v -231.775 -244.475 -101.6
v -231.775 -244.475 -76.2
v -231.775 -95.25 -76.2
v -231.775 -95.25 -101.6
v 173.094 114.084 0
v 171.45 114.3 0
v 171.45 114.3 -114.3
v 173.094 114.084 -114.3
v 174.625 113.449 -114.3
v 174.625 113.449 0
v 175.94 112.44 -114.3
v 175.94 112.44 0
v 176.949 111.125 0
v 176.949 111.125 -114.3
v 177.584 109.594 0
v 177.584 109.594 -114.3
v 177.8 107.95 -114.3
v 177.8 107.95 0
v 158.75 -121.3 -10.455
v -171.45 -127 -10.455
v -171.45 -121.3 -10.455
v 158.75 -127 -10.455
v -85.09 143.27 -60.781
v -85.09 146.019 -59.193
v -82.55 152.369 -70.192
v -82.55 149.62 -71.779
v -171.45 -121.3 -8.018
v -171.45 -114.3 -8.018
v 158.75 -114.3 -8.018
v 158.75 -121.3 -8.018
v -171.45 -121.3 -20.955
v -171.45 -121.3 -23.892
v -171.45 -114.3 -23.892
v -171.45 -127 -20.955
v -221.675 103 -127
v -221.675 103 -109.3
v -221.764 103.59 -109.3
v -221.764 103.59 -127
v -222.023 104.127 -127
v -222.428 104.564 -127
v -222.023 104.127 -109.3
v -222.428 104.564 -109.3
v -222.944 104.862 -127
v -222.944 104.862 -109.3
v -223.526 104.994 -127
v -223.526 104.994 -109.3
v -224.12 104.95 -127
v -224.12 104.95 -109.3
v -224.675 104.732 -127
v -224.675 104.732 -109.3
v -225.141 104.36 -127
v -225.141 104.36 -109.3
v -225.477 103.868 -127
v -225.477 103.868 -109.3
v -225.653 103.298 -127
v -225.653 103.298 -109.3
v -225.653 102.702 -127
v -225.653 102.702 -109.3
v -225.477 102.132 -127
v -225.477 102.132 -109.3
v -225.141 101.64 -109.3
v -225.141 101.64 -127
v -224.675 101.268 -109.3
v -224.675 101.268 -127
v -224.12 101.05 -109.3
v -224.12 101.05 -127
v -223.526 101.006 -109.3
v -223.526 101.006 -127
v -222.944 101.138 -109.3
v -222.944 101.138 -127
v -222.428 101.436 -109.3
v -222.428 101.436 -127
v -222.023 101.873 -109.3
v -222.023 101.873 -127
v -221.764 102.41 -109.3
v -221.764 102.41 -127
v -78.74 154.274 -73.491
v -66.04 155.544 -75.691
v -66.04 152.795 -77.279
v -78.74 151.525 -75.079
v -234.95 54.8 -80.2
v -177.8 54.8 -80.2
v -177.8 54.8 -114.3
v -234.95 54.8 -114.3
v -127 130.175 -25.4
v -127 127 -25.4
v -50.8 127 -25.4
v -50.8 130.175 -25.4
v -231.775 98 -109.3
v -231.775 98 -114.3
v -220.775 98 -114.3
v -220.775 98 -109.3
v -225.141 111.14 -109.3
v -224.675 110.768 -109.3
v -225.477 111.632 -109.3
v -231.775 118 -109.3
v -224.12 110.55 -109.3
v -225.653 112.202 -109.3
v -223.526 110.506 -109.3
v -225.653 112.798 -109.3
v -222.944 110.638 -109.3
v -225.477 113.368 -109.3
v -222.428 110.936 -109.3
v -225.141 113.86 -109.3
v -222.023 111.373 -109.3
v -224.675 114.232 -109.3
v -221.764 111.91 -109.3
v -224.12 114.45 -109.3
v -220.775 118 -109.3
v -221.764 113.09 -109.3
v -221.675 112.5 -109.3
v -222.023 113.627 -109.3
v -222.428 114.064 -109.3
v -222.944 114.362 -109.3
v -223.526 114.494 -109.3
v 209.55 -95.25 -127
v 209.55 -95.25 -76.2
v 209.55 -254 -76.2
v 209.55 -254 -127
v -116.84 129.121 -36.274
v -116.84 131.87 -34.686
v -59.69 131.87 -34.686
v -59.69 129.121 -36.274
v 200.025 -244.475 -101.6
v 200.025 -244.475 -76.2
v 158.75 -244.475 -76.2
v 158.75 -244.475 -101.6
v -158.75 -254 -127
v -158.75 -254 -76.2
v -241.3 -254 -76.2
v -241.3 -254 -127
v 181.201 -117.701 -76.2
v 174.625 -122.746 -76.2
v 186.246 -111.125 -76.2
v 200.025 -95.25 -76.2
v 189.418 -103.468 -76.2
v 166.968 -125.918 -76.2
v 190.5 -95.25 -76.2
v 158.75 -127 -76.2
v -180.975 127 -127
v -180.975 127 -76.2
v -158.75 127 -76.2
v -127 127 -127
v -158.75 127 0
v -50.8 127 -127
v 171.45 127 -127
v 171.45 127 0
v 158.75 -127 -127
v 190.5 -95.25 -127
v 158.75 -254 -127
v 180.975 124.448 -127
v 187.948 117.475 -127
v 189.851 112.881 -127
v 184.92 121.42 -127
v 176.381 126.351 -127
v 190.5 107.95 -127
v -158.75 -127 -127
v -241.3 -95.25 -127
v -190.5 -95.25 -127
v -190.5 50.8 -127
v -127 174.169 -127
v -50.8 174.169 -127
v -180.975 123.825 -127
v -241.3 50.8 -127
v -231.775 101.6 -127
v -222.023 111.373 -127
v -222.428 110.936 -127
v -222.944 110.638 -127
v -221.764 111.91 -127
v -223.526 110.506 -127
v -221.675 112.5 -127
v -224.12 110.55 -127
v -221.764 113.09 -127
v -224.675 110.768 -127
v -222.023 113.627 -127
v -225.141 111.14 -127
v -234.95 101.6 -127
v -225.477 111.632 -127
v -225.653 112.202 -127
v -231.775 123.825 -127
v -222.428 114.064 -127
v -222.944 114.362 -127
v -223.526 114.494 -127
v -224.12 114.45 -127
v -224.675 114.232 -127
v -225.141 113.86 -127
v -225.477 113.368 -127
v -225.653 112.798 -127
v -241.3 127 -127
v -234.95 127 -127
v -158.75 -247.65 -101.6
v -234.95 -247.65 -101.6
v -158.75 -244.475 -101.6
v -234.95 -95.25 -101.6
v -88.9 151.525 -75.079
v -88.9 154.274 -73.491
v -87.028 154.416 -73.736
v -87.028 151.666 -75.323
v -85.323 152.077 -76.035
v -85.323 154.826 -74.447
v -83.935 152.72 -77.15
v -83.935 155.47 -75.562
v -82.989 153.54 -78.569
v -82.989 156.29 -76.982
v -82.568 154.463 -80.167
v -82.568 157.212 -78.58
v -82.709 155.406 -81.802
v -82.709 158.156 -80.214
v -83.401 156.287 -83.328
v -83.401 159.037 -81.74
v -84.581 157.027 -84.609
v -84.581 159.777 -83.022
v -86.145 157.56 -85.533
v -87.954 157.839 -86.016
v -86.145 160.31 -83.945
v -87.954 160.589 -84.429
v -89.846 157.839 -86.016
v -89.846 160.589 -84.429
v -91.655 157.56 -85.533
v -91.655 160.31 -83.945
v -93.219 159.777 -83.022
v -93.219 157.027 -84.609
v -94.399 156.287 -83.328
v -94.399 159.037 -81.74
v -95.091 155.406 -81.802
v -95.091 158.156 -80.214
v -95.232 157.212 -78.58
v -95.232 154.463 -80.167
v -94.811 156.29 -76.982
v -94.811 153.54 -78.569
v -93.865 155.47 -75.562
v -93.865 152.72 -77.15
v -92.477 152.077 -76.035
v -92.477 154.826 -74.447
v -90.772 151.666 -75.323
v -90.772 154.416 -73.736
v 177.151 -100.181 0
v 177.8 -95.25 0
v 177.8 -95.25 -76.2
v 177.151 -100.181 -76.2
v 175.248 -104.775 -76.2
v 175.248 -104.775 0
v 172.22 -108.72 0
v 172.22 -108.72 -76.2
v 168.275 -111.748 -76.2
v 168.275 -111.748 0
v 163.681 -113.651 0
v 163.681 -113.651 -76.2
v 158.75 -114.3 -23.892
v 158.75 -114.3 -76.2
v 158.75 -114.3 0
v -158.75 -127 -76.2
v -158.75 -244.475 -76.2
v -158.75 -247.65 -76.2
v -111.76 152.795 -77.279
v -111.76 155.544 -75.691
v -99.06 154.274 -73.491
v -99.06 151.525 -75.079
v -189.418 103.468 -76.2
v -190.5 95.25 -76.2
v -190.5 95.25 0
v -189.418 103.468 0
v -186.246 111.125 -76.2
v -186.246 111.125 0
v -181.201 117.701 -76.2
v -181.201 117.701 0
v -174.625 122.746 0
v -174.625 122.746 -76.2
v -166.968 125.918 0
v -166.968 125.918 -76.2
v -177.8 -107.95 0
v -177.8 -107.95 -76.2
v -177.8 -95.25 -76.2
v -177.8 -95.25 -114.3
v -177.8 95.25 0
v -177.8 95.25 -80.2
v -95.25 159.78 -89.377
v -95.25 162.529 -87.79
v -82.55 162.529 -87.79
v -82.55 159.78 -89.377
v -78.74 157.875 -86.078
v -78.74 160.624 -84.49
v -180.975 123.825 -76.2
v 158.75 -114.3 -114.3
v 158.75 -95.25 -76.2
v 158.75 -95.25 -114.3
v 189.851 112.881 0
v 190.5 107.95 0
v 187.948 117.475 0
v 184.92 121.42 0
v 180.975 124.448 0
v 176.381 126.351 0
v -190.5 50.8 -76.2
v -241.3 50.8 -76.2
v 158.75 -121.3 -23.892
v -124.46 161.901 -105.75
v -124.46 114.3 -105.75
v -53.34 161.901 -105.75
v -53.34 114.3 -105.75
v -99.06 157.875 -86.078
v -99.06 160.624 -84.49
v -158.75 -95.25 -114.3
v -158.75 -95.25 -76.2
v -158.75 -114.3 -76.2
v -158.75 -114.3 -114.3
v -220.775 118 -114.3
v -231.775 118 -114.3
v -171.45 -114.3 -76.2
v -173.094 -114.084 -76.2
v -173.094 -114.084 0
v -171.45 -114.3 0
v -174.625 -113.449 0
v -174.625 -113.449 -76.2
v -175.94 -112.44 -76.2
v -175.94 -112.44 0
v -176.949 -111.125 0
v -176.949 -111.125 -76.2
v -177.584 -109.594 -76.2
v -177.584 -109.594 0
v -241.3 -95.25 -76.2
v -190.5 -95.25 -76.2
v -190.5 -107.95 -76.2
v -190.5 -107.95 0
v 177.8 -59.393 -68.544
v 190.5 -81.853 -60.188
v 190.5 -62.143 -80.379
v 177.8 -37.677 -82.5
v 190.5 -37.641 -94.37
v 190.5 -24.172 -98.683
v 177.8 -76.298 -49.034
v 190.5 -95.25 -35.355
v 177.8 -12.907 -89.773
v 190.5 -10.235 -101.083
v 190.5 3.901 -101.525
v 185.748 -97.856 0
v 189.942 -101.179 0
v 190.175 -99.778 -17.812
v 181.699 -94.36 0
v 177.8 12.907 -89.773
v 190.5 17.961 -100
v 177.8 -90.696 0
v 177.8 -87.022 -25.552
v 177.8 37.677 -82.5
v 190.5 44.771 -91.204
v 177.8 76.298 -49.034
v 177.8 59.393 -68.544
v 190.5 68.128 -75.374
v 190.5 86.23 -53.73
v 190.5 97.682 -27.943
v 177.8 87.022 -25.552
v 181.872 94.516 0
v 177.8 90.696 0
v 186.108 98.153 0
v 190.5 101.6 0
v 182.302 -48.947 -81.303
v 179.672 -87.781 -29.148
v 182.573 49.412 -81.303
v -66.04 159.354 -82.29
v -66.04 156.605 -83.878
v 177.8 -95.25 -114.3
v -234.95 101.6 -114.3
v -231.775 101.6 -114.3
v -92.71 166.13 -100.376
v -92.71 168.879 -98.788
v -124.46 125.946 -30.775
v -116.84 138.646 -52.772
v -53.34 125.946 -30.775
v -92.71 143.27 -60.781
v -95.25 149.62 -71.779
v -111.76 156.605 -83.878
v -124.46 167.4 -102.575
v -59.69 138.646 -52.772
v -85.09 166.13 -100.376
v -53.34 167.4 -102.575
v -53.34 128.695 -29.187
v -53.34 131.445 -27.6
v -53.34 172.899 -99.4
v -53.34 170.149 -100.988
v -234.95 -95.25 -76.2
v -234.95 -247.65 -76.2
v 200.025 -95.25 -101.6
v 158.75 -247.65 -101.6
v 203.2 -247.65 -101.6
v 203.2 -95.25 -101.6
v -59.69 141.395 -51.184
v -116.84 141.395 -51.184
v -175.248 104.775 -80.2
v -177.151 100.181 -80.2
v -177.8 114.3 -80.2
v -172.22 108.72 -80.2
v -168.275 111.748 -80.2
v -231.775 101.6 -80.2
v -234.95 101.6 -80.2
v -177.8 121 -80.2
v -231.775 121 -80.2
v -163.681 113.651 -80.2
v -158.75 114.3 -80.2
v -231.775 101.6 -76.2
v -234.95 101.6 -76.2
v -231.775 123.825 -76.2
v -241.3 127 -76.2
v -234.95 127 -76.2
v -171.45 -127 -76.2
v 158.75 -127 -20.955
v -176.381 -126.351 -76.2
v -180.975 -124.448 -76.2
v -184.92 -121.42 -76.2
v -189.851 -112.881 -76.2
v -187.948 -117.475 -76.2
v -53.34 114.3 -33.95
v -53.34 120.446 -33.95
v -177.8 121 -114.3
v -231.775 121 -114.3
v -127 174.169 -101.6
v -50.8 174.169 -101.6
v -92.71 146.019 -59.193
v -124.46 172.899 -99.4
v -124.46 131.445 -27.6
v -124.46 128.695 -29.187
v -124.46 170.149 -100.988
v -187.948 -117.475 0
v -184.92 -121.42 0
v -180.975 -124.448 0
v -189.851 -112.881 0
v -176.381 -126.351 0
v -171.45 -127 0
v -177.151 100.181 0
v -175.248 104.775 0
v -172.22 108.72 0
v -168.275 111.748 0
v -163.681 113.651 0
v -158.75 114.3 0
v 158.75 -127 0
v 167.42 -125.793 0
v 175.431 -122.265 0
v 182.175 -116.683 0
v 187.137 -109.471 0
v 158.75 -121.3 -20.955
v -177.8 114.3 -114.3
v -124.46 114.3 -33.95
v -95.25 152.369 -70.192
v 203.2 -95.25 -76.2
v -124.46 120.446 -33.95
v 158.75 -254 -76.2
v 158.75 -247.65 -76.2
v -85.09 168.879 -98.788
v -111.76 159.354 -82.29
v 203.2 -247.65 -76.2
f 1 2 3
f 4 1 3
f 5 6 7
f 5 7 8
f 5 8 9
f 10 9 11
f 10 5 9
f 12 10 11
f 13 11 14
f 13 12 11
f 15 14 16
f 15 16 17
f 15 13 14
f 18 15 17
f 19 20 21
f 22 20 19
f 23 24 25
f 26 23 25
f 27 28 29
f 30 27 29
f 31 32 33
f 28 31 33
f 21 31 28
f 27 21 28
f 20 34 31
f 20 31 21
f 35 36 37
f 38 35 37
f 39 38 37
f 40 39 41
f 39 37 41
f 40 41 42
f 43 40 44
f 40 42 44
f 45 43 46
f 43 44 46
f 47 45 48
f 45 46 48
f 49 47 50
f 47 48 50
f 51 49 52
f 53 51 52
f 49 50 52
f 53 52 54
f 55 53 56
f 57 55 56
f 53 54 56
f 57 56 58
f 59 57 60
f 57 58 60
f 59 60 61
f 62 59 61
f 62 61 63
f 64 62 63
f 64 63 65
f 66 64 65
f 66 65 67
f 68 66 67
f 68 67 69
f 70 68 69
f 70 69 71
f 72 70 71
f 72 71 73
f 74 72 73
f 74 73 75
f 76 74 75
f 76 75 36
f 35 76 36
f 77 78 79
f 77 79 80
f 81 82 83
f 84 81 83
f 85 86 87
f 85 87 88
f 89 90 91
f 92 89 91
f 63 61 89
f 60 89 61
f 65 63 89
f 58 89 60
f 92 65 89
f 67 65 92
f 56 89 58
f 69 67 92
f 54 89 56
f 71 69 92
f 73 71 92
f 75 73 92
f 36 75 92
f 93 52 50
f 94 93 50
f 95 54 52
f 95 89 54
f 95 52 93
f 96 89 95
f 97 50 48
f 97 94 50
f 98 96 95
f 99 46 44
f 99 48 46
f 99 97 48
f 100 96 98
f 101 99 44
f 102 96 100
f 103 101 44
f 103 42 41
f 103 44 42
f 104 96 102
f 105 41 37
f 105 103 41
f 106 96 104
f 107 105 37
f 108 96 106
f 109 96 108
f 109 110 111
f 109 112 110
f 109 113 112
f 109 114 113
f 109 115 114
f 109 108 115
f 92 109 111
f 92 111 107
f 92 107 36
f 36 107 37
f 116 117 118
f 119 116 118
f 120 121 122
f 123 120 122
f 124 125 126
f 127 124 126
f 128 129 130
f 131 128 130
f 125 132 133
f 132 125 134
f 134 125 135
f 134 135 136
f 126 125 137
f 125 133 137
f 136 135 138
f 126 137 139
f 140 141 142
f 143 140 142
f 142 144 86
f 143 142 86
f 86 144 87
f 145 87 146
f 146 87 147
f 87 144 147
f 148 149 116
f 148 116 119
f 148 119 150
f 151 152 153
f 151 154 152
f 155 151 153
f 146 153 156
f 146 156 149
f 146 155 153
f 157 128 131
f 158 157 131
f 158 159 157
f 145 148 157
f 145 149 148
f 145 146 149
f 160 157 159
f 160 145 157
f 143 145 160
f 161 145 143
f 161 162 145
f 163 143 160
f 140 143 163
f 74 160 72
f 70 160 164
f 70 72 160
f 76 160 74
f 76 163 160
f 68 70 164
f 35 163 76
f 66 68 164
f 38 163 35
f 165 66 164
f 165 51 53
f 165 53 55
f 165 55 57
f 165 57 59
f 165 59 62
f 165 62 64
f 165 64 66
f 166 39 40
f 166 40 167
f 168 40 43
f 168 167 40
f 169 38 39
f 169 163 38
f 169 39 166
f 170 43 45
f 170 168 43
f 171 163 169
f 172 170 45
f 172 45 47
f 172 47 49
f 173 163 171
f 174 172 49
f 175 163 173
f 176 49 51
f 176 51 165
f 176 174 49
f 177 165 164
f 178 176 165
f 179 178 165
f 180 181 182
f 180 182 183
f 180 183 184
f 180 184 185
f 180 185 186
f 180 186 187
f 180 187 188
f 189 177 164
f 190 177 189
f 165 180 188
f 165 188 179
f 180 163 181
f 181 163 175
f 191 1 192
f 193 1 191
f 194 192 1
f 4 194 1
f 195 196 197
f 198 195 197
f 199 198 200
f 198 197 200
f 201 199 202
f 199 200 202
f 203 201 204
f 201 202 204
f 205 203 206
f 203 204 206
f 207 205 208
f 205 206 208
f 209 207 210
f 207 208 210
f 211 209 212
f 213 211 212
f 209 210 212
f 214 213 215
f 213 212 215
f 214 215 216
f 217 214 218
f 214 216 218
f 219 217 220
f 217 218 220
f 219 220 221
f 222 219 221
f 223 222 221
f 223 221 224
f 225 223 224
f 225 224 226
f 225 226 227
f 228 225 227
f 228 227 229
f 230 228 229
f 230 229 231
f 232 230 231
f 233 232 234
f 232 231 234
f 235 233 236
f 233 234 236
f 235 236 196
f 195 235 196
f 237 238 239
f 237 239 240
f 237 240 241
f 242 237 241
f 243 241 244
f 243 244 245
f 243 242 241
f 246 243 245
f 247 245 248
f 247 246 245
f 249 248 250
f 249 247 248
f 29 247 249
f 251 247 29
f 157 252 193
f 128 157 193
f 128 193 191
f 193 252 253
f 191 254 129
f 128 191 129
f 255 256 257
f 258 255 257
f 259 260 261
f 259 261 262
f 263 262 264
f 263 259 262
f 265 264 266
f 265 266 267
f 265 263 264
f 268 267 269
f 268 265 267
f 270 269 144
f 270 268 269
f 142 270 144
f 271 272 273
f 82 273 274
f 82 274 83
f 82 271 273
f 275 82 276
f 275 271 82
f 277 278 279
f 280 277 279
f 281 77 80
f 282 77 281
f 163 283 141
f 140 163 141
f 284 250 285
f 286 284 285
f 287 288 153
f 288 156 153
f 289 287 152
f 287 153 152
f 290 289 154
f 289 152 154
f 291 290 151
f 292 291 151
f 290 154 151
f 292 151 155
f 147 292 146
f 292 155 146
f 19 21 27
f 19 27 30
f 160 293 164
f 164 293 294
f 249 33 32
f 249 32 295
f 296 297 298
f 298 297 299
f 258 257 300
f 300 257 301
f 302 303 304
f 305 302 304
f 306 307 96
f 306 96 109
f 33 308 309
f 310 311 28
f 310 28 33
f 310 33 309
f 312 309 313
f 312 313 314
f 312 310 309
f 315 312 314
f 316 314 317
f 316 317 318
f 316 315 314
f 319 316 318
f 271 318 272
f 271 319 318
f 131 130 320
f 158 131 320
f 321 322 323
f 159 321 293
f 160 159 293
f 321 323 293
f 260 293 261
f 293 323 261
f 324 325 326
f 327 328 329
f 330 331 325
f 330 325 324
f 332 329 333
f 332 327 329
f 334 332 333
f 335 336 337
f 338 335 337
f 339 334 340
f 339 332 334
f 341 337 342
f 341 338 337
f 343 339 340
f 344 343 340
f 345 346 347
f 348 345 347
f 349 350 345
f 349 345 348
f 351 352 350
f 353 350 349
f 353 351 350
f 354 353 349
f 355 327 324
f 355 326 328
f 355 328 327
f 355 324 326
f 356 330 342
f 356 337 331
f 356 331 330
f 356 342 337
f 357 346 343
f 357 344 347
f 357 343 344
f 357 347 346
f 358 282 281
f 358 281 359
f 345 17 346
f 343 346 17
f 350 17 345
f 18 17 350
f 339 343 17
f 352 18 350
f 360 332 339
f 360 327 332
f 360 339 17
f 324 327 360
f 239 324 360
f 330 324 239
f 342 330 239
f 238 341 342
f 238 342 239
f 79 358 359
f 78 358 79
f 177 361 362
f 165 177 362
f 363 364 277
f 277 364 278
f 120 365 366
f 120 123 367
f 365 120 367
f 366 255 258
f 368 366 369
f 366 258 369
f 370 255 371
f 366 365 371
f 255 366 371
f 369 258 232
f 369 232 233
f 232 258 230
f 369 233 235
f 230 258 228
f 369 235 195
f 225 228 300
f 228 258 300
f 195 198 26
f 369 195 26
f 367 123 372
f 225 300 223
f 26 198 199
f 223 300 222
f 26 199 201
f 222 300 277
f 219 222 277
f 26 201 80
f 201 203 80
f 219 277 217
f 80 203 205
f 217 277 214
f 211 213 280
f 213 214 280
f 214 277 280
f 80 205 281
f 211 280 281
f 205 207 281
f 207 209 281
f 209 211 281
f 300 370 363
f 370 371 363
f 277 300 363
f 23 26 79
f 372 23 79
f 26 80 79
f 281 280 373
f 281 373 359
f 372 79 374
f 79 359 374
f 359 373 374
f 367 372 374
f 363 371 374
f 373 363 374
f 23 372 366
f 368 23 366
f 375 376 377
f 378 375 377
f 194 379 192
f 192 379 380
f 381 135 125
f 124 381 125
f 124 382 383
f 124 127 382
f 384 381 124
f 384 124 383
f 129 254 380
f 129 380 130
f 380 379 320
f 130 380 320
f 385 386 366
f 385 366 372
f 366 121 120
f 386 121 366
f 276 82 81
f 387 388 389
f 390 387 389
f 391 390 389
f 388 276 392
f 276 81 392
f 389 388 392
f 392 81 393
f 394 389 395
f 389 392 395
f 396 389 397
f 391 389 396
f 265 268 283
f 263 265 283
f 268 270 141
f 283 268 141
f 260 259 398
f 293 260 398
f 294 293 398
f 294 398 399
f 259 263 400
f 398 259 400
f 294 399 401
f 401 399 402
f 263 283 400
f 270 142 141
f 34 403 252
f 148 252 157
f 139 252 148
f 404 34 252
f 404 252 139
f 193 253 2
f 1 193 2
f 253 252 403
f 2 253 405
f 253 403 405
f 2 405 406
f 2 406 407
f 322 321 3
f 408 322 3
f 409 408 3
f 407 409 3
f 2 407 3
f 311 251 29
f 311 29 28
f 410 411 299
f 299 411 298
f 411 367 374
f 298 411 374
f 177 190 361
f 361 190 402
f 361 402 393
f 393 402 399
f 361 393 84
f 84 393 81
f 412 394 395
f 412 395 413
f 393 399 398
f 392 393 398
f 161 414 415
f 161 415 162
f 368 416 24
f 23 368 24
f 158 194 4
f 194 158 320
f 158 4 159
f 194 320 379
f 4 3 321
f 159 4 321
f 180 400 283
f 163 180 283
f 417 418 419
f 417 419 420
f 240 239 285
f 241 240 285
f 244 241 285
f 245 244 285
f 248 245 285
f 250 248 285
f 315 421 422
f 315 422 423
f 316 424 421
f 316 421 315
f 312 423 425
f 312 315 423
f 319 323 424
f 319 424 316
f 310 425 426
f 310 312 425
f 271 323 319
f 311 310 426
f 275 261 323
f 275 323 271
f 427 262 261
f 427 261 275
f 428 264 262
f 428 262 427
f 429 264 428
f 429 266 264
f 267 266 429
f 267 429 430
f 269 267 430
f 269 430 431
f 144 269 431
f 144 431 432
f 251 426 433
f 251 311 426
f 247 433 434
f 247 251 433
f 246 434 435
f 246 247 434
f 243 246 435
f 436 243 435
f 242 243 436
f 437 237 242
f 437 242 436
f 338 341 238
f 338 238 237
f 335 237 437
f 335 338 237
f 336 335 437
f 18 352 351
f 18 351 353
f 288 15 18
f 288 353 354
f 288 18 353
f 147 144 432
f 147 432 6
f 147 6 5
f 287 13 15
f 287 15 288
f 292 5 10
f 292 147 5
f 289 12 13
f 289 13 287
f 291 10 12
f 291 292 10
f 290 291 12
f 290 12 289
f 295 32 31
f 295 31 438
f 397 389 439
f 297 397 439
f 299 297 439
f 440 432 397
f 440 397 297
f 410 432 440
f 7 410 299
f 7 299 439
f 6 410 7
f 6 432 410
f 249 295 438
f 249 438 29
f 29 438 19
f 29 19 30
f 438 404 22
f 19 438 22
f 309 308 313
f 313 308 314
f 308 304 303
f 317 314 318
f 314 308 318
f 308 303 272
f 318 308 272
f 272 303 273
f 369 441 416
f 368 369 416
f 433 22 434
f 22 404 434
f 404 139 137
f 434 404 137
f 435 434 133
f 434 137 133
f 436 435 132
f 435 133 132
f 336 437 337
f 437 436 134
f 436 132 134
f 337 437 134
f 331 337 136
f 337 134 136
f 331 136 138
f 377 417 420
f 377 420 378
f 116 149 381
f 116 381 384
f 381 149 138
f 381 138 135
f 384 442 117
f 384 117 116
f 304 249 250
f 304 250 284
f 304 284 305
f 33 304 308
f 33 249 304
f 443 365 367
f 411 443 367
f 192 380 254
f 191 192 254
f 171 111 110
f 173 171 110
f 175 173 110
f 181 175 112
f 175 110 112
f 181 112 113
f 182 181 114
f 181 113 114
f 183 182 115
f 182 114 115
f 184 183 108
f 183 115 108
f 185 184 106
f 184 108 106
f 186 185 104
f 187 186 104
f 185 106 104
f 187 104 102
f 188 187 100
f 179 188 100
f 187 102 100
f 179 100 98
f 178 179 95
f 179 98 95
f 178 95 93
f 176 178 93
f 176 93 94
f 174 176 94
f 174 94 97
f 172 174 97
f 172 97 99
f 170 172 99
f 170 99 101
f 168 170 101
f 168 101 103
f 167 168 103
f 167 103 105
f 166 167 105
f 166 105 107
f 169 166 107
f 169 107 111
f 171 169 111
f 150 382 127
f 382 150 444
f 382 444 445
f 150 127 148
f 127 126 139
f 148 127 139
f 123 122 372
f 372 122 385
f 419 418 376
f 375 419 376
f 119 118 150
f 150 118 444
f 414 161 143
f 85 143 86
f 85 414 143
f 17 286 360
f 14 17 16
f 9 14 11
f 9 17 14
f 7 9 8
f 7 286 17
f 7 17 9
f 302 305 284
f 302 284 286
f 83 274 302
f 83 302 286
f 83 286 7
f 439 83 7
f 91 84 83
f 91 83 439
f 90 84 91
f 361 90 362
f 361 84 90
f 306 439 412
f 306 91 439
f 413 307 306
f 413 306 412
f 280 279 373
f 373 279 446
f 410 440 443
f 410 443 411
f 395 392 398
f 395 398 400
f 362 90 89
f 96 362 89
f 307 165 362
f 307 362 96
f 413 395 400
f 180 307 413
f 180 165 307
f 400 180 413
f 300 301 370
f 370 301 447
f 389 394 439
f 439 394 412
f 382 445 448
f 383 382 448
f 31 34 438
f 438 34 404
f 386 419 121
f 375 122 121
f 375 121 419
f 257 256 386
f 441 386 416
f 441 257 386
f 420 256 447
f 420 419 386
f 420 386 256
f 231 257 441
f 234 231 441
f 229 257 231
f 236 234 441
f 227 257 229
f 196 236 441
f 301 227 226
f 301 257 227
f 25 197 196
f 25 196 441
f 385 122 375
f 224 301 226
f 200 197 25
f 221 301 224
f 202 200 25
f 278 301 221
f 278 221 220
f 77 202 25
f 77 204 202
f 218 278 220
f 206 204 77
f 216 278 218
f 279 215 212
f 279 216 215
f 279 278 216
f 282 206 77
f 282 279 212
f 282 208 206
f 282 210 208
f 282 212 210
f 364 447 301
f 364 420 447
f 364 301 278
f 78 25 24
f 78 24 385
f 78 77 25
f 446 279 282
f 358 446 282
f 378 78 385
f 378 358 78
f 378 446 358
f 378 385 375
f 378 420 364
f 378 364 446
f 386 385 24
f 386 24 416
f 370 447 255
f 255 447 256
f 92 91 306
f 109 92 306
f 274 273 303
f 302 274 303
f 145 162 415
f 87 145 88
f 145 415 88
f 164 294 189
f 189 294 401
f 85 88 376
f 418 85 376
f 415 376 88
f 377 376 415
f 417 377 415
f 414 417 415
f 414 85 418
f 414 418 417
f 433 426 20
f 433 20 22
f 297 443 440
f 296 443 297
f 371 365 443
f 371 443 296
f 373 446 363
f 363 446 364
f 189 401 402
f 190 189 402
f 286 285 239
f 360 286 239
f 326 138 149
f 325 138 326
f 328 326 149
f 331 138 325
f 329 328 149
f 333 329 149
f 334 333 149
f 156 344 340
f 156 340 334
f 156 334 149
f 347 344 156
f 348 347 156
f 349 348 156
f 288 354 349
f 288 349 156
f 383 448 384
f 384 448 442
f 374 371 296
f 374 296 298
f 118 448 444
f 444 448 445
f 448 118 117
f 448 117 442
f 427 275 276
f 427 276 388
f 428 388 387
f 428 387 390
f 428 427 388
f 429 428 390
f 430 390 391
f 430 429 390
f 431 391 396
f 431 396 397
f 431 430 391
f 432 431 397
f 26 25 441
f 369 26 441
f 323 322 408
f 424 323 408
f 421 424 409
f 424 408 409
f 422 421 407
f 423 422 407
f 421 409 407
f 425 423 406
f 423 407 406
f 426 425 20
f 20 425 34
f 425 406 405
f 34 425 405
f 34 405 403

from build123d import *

# Parameters (mm, degrees)
SKETCH1_W           = 381
SKETCH1_H           = 254
BOSS_EXTRUDE1_DEPTH = 127
FILLET5_R           = 19.05
FILLET4_R           = 31.75
CUT_EXTRUDE1_DEPTH  = 114.3
CUT_EXTRUDE2_REACH  = 343.958
SKETCH5_W           = 330.2
SKETCH5_H           = 10.5
BOSS_EXTRUDE2_START = -50.8
BOSS_EXTRUDE2_DEPTH = 50.8
CUT_EXTRUDE3_DEPTH  = 25.4
BOSS_EXTRUDE3_DEPTH = 76.2
SKETCH10_W          = 71.12
SKETCH10_H          = 82.908181025
CUT_EXTRUDE4_DEPTH  = 12.7
CUT_EXTRUDE5_REACH  = 460.257
SKETCH11_W          = 71.12
SKETCH11_H          = 71.800590948
SKETCH12_W          = 71.12
SKETCH12_H          = 82.908181025
SKETCH12_R          = 6.35
SKETCH12_W_2        = 57.15
SKETCH12_H_2        = 19.05
BOSS_EXTRUDE4_DEPTH = 3.175
SKETCH13_W          = 330.2
SKETCH13_H          = 15.875
CUT_EXTRUDE6_DEPTH  = 7
SKETCH14_W          = 34.1
SKETCH14_H          = 66.2
CUT_EXTRUDE7_DEPTH  = 57.15
CUT_EXTRUDE8_START  = 34.1
CUT_EXTRUDE8_DEPTH  = 34.1
SKETCH16_W          = 11
SKETCH16_H          = 20
BOSS_EXTRUDE5_DEPTH = 5
SKETCH17_R          = 2
CUT_EXTRUDE9_DEPTH  = 367.998882862


# Read off the part's stored shape, not the designer's step: Boss-Extrude2
with BuildPart() as part:
    # Sketch1 → Boss-Extrude1 (new body)
    with BuildSketch(Plane.XY):
        Rectangle(SKETCH1_W, SKETCH1_H)
    extrude(amount=-BOSS_EXTRUDE1_DEPTH)

    # Fillet5
    fillet5_edges = [part.edges().sort_by_distance(p)[0] for p in [
        (-190.5, -127, -63.5),
        (190.5, 127, -63.5),
    ]]
    fillet(fillet5_edges, radius=FILLET5_R)

    # Fillet4
    fillet4_edges = [part.edges().sort_by_distance(p)[0] for p in [
        (190.5, -127, -63.5),
        (-190.5, 127, -63.5),
    ]]
    fillet(fillet4_edges, radius=FILLET4_R)

    # Sketch3 → Cut-Extrude1 (cut)
    with BuildSketch(Plane(origin=(0, 0, 0), x_dir=(-1, 0, 0), z_dir=(0, 0, -1))):
        with BuildLine():
            Line((-158.75, -114.3), (171.45, -114.3))
            ThreePointArc((171.45, -114.3), (175.940128061, -112.440128061), (177.8, -107.95))
            Line((177.8, -107.95), (177.8, 95.25))
            ThreePointArc((177.8, 95.25), (172.220384182, 108.720384182), (158.75, 114.3))
            Line((158.75, 114.3), (-171.45, 114.3))
            ThreePointArc((-171.45, 114.3), (-175.940128061, 112.440128061), (-177.8, 107.95))
            Line((-177.8, 107.95), (-177.8, -95.25))
            ThreePointArc((-177.8, -95.25), (-172.220384182, -108.720384182), (-158.75, -114.3))
        make_face()
    extrude(amount=CUT_EXTRUDE1_DEPTH, mode=Mode.SUBTRACT)

    # Sketch5 → Cut-Extrude2 (cut, up to next)
    with BuildSketch(Plane.XZ.offset(127), mode=Mode.PRIVATE) as cut_extrude2_sk1:
        with Locations((-6.35, -15.705)):
            Rectangle(SKETCH5_W, SKETCH5_H)
    cut_extrude2_tool1 = extrude(cut_extrude2_sk1.sketch, amount=-CUT_EXTRUDE2_REACH, mode=Mode.PRIVATE) & part.part
    add(cut_extrude2_tool1.solids().sort_by_distance((-6.35, -127, -15.705))[0], mode=Mode.SUBTRACT)

    # Sketch6 → Cut-Revolve1 (revolve, cut)
    with BuildSketch(Plane(origin=(0, 0, 0), x_dir=(1, 0, 0), z_dir=(0, 1, 0))):
        with BuildLine():
            Line((139.7, 0), (266.7, 0))
            Line((266.7, 0), (266.7, 127))
            ThreePointArc((266.7, 127), (176.897438789, 89.802561211), (139.7, 0))
        make_face()
    revolve(axis=Axis((266.7, 0, 0), (0, 0, -1)), mode=Mode.SUBTRACT)

    # Boss-Extrude2 outline → Boss-Extrude2 (add)
    with BuildSketch(Plane(origin=(0, 0, -127), x_dir=(-1, 0, 0), z_dir=(0, 0, -1)).offset(BOSS_EXTRUDE2_START)):
        with BuildLine():
            Line((-158.75, -254), (-158.75, -127))
            ThreePointArc((-158.75, -127), (-181.200640303, -117.700640303), (-190.5, -95.25))
            Line((-190.5, -95.25), (-209.55, -95.25))
            Line((-209.55, -95.25), (-209.55, -254))
            Line((-209.55, -254), (-158.75, -254))
        make_face()
        with BuildLine():
            ThreePointArc((-177.8, -95.25), (-172.220384182, -108.720384182), (-158.75, -114.3))
            Line((-158.75, -114.3), (-158.75, -95.25))
            Line((-158.75, -95.25), (-177.8, -95.25))
        make_face()
        with BuildLine():
            Line((158.75, -95.25), (158.75, -114.3))
            Line((158.75, -114.3), (171.45, -114.3))
            ThreePointArc((171.45, -114.3), (175.940128061, -112.440128061), (177.8, -107.95))
            Line((177.8, -107.95), (177.8, -95.25))
            Line((177.8, -95.25), (158.75, -95.25))
        make_face()
        with BuildLine():
            Line((241.3, -95.25), (190.5, -95.25))
            Line((190.5, -95.25), (190.5, -107.95))
            ThreePointArc((190.5, -107.95), (184.920384182, -121.420384182), (171.45, -127))
            Line((171.45, -127), (158.75, -127))
            Line((158.75, -127), (158.75, -254))
            Line((158.75, -254), (241.3, -254))
            Line((241.3, -254), (241.3, -95.25))
        make_face()
        with BuildLine():
            Line((241.3, 127), (234.95, 127))
            Line((234.95, 127), (234.95, 101.6))
            Line((234.95, 101.6), (231.775, 101.6))
            Line((231.775, 101.6), (231.775, 123.825))
            Line((231.775, 123.825), (180.975, 123.825))
            Line((180.975, 123.825), (180.975, 127))
            Line((180.975, 127), (158.75, 127))
            ThreePointArc((158.75, 127), (181.200640303, 117.700640303), (190.5, 95.25))
            Line((190.5, 95.25), (190.5, 50.8))
            Line((190.5, 50.8), (241.3, 50.8))
            Line((241.3, 50.8), (241.3, 127))
        make_face()
    extrude(amount=BOSS_EXTRUDE2_DEPTH)

    # Sketch8 → Cut-Extrude3 (cut)
    with BuildSketch(Plane.XY.offset(-76.2)):
        Polygon((-234.95, -95.25), (-234.95, -247.65), (-158.75, -247.65), (-158.75, -244.475), (-231.775, -244.475), (-231.775, -95.25), align=None)
        Polygon((158.75, -247.65), (203.2, -247.65), (203.2, -95.25), (200.025, -95.25), (200.025, -244.475), (158.75, -244.475), align=None)
    extrude(amount=-CUT_EXTRUDE3_DEPTH, mode=Mode.SUBTRACT)

    # Sketch9 → Boss-Extrude3 (add)
    with BuildSketch(Plane(origin=(-127, 0, 0), x_dir=(0, 0, -1), z_dir=(1, 0, 0))):
        Polygon((25.4, 127), (25.4, 130.175), (101.6, 174.169090512), (127, 174.169090512), (127, 127), align=None)
    extrude(amount=BOSS_EXTRUDE3_DEPTH)

    # Sketch10 → Cut-Extrude4 (cut)
    with BuildSketch(Plane(origin=(0, 86.632727372, 50.017428469), x_dir=(1, 0, 0), z_dir=(0, 0.866025403784436, 0.5000000000000047))):
        with Locations((-88.9, 131.078635769)):
            Rectangle(SKETCH10_W, SKETCH10_H)
    extrude(amount=-CUT_EXTRUDE4_DEPTH, mode=Mode.SUBTRACT)

    # Cut-Extrude5: up to this face of the body (flat: up to its plane)
    cut_extrude5_end = Plane(part.part.faces().sort_by_distance((-88.9, 141.173522628, -69.85))[0])
    # Sketch11 → Cut-Extrude5 (cut, up to the picked face)
    with BuildSketch(Plane.XZ.offset(-114.3), mode=Mode.PRIVATE) as cut_extrude5_sk1:
        with Locations((-88.9, -69.85)):
            Rectangle(SKETCH11_W, SKETCH11_H)
    cut_extrude5_tool1 = split(extrude(cut_extrude5_sk1.sketch, amount=-CUT_EXTRUDE5_REACH, mode=Mode.PRIVATE), bisect_by=cut_extrude5_end, keep=Keep.BOTH, mode=Mode.PRIVATE)
    add(cut_extrude5_tool1.solids().sort_by(Axis((-88.9, 114.3, -69.85), (0, 1, 0)))[0], mode=Mode.SUBTRACT)

    # Sketch12 → Boss-Extrude4 (add)
    with BuildSketch(Plane(origin=(0, 83.883096715, 48.429928469), x_dir=(1, 0, 0), z_dir=(0, 0.866025403784436, 0.5000000000000047))):
        with Locations((-88.9, 131.078635769)):
            Rectangle(SKETCH12_W, SKETCH12_H)
        with Locations(Location((-88.9, 147.132726281, 0), (0, 0, 270))):
            Circle(SKETCH12_R, mode=Mode.SUBTRACT)
        Polygon((-82.55, 136.972726281), (-95.25, 136.972726281), (-92.71, 124.272726281), (-85.09, 124.272726281), align=None, mode=Mode.SUBTRACT)
        Polygon((-78.74, 153.482726281), (-66.04, 150.942726281), (-66.04, 143.322726281), (-78.74, 140.782726281), align=None, mode=Mode.SUBTRACT)
        Polygon((-99.06, 140.782726281), (-99.06, 153.482726281), (-111.76, 150.942726281), (-111.76, 143.322726281), align=None, mode=Mode.SUBTRACT)
        Polygon((-95.25, 157.292726281), (-82.55, 157.292726281), (-85.09, 169.992726281), (-92.71, 169.992726281), align=None, mode=Mode.SUBTRACT)
        with Locations((-88.265, 105.499545256)):
            Rectangle(SKETCH12_W_2, SKETCH12_H_2, mode=Mode.SUBTRACT)
    extrude(amount=-BOSS_EXTRUDE4_DEPTH)

    # Sketch13 → Cut-Extrude6 (cut)
    with BuildSketch(Plane(origin=(0, -114.3, 0), x_dir=(1, 0, 0), z_dir=(0, 1, 0))):
        with Locations((-6.35, 15.955)):
            Rectangle(SKETCH13_W, SKETCH13_H)
    extrude(amount=-CUT_EXTRUDE6_DEPTH, mode=Mode.SUBTRACT)

    # Sketch14 → Cut-Extrude7 (cut)
    with BuildSketch(Plane(origin=(-234.95, 0, 0), x_dir=(0, 0, -1), z_dir=(1, 0, 0))):
        with Locations((97.25, 87.9)):
            Rectangle(SKETCH14_W, SKETCH14_H)
    extrude(amount=CUT_EXTRUDE7_DEPTH, mode=Mode.SUBTRACT)

    # Sketch15 → Cut-Extrude8 (cut)
    with BuildSketch(Plane.XY.offset(-114.3).offset(CUT_EXTRUDE8_START)):
        with BuildLine():
            Line((-158.75, 114.3), (-177.8, 114.3))
            Line((-177.8, 114.3), (-177.8, 95.25))
            ThreePointArc((-177.8, 95.25), (-172.220384182, 108.720384182), (-158.75, 114.3))
        make_face()
    extrude(amount=-CUT_EXTRUDE8_DEPTH, mode=Mode.SUBTRACT)

    # Sketch16 → Boss-Extrude5 (add)
    with BuildSketch(Plane.XY.offset(-114.3)):
        with Locations((-226.275, 108)):
            Rectangle(SKETCH16_W, SKETCH16_H)
    extrude(amount=BOSS_EXTRUDE5_DEPTH)

    # Sketch17 → Cut-Extrude9 (cut, through all)
    with BuildSketch(Plane.XY.offset(-109.3)):
        with Locations((-223.675, 112.5)):
            Circle(SKETCH17_R)
        with Locations((-223.675, 103)):
            Circle(SKETCH17_R)
    extrude(amount=-CUT_EXTRUDE9_DEPTH, mode=Mode.SUBTRACT)


solid = part.part
